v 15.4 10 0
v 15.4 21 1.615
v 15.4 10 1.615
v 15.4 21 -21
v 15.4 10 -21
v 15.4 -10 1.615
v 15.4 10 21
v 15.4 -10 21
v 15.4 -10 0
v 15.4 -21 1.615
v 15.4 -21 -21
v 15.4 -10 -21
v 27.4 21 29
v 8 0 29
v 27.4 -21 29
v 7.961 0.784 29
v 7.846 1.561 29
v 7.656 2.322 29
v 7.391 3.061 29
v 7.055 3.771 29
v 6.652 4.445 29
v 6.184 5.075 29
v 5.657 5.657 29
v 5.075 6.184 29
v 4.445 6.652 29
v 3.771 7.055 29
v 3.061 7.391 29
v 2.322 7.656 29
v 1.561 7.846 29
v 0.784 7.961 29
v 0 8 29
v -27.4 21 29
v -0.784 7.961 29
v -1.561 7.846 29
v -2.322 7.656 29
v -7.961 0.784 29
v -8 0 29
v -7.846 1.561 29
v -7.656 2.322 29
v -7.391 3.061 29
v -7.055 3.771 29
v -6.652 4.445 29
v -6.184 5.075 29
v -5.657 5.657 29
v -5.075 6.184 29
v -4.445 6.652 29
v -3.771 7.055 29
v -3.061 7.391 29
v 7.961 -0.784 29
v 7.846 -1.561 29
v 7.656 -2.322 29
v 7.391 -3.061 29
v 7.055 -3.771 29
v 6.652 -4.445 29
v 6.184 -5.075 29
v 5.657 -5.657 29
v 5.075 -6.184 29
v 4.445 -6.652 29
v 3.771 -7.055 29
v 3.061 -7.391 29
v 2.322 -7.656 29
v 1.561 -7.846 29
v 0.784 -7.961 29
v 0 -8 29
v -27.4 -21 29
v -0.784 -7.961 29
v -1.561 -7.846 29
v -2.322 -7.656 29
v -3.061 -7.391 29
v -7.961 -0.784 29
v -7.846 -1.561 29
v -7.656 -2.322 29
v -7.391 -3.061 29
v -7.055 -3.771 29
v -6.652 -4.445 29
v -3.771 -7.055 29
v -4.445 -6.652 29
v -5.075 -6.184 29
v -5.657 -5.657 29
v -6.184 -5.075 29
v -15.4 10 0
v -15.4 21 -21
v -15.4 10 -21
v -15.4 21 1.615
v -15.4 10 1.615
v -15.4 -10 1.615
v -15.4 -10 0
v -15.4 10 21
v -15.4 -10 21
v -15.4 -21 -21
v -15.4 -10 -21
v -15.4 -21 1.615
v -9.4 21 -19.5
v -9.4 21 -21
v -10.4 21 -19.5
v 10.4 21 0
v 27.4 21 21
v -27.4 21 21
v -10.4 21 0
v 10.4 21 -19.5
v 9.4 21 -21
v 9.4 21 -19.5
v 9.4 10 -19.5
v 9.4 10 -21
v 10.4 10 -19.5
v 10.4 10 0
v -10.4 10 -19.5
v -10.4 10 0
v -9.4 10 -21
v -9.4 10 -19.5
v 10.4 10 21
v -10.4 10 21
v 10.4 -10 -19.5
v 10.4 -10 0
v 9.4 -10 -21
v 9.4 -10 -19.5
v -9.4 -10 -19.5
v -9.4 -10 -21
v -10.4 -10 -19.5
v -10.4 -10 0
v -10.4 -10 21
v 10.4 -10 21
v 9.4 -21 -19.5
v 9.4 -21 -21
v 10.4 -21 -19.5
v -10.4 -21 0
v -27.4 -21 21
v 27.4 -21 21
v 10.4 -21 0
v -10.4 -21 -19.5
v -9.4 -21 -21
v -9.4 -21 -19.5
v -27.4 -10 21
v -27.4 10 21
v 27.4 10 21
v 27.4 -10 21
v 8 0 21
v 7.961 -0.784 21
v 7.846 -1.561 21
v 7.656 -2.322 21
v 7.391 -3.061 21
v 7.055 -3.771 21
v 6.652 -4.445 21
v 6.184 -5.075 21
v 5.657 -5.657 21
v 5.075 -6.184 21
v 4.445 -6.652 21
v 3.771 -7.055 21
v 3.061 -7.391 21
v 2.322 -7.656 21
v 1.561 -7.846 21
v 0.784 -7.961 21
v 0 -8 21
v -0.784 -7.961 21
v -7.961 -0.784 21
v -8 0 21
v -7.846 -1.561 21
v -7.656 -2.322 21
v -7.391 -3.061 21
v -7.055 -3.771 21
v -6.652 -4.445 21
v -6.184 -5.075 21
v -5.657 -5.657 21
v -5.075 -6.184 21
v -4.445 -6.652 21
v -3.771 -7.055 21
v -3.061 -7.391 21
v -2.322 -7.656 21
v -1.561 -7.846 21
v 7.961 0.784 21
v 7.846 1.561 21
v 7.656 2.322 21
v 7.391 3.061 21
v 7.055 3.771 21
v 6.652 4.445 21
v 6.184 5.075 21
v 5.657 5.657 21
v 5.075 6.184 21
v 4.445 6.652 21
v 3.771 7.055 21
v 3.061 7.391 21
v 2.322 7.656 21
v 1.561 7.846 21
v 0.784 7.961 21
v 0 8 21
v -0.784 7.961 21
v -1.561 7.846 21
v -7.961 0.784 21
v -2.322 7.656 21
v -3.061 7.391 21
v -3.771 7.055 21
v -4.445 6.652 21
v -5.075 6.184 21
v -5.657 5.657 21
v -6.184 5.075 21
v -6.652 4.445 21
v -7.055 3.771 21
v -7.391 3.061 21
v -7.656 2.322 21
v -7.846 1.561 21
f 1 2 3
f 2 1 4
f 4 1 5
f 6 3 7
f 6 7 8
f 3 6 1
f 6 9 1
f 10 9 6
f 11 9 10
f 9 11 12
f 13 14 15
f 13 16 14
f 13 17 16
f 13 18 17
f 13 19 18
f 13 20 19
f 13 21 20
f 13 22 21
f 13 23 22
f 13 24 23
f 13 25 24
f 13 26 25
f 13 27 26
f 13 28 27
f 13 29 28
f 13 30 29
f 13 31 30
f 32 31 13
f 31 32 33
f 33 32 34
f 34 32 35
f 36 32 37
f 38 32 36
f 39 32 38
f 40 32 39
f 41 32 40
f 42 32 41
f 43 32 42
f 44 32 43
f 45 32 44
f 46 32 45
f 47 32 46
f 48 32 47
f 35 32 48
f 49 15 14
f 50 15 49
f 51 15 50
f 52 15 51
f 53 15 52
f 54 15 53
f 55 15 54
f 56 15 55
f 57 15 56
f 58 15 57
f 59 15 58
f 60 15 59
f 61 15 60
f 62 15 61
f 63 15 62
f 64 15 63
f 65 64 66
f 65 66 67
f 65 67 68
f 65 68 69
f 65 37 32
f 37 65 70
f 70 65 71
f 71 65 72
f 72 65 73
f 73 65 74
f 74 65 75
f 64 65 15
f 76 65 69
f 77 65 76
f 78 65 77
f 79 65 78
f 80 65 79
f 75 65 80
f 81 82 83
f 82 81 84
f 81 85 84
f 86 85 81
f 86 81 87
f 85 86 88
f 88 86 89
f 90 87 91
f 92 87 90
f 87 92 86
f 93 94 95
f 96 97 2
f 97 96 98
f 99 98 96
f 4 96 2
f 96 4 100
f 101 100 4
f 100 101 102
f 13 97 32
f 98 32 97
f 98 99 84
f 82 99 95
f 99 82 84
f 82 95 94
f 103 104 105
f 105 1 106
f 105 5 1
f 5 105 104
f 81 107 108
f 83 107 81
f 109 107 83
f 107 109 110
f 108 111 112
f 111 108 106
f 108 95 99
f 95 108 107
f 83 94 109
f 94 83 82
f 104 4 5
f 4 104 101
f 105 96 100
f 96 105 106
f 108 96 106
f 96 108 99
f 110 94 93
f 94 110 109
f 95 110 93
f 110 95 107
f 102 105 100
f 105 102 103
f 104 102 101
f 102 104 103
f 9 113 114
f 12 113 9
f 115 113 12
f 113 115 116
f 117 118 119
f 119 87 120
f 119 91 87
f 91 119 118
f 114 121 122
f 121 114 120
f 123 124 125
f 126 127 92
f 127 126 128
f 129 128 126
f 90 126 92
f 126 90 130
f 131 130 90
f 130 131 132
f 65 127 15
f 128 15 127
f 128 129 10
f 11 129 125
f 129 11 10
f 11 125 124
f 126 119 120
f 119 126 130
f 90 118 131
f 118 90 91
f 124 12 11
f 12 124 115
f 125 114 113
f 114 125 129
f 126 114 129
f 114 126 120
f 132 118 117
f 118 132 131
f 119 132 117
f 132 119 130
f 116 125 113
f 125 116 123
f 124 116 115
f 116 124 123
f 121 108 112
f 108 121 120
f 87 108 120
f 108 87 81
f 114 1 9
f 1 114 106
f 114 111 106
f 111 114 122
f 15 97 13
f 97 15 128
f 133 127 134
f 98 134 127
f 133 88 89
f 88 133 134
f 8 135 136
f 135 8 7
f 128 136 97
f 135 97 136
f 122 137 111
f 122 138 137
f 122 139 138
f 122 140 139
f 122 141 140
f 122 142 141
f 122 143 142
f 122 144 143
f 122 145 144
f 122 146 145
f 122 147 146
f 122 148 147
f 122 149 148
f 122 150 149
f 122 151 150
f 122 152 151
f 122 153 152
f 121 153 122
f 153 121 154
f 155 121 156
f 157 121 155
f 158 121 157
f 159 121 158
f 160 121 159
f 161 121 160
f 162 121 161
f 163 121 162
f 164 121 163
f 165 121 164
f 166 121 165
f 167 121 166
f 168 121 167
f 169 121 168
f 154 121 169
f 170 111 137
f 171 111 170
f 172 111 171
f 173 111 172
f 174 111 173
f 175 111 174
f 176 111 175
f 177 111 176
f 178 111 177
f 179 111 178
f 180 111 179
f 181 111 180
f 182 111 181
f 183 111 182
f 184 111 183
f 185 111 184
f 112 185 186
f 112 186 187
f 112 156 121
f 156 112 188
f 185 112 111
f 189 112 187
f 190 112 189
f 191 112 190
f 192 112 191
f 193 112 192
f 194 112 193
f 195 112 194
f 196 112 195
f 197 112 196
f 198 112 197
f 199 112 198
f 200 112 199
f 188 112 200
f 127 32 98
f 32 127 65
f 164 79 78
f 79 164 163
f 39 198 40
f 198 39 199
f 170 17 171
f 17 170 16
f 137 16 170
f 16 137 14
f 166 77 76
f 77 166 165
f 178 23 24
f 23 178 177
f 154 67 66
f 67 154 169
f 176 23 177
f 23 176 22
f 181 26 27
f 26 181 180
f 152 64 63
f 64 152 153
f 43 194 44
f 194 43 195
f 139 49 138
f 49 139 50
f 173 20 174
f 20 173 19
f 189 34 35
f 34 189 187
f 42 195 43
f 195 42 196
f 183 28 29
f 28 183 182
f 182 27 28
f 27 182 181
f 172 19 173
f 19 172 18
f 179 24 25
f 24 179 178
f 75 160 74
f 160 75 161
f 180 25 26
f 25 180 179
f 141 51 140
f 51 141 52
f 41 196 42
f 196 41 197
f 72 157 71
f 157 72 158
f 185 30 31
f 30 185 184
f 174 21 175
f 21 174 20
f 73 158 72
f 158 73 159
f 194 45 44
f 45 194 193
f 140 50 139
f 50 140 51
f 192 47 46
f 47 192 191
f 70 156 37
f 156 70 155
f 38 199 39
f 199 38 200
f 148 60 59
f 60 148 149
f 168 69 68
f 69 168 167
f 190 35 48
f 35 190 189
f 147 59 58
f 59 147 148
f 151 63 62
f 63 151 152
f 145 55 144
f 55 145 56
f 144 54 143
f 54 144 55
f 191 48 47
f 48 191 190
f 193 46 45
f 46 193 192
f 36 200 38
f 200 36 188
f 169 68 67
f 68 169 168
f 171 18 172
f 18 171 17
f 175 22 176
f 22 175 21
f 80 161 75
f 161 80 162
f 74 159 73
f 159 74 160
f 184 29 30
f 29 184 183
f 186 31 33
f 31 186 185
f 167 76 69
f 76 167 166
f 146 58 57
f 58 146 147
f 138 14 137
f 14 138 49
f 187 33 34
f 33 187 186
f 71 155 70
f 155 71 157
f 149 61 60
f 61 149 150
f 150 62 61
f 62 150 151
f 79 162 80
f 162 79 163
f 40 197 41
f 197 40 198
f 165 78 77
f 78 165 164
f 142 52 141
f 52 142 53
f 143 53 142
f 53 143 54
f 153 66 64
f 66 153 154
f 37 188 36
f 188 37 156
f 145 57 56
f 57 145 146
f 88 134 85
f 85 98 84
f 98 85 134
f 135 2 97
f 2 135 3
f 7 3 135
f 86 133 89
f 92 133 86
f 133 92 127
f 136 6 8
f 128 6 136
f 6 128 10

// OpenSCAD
// file: ../perpendicular-u-joint-guard-v1.3-triangular-corner-fills/candidate_triangular_corner_fills.scad
// Candidate v1.3: four triangular concave-corner fill blocks.
//
// Base: accepted v0.7 eaves12 geometry. v0.9/v1.0/v1.1/v1.2 are not
// imported. Each corner block is a real triangular prism: broad at the roof,
// tapering continuously toward z=0, and overlapping the U side wall.

use <../perpendicular-u-joint-guard-v0.7/perpendicular_double_u_guard.scad>;

$fn = 48;
PART = "candidate_iso";

// Explicit v0.7 interface values.
roof_x_outer = 27.4;       // accepted eaves12 roof: -27.4..+27.4
side_wall_x_outer = 15.4;  // existing side-wall outer edge
blue_tube_x_outer = 10.0;  // blue lower 20x20 tube half-width
plate_y_inner = 10.0;
plate_y_outer = 21.0;
plate_depth_y = plate_y_outer - plate_y_inner; // 11 mm per front/back U plate

// The top edge is 0.5 mm inside the roof volume (roof underside z=21), and
// the lower point enters the side wall by 1 mm in X.  The XZ area therefore
// has positive overlap at both ends, not edge-only contact.
triangle_top_z = 21.5;
triangle_bottom_z = 0.0;
triangle_roof_overlap_z = triangle_top_z - 21.0;
triangle_side_overlap_x = 1.0;
triangle_inner_x = side_wall_x_outer - triangle_side_overlap_x; // 14.4

// Bottom retaining-hook contract copied from v0.7 for explicit verification.
hook_height_z = 1.5;
u_bottom_z = -21.0;
hook_top_z = u_bottom_z + hook_height_z; // -19.5

assert(plate_depth_y == 11, "每个三角块的前后板深必须是 11 mm");
assert(triangle_top_z > 21 && triangle_bottom_z == 0,
       "三角块上端必须搭入屋檐、下端落到 z=0");
assert(triangle_inner_x > blue_tube_x_outer,
       "三角块下端不得进入蓝色方管 x=-10..+10 包络");
assert(triangle_side_overlap_x > 0 && triangle_roof_overlap_z > 0,
       "三角块必须与屋檐和侧墙都有正重叠");
assert(hook_height_z == 1.5 && u_bottom_z == -21 && hook_top_z == -19.5,
       "底部卡脚必须保持 z=-21..-19.5");

// A polygon in XZ is extruded only through the corresponding front/back U
// plate. The center y=-10..+10 passage remains open.
module triangular_fill_xz(points, yc) {
    translate([0, yc, 0])
        rotate([90, 0, 0])
            linear_extrude(height = plate_depth_y,
                           center = true,
                           convexity = 10)
                polygon(points = points);
}

module front_neg_x_triangle() {
    // -X roof end -> +X inward. Top wide, lower point at the side wall.
    triangular_fill_xz([
        [-roof_x_outer, 21.0],
        [-triangle_inner_x, triangle_top_z],
        [-triangle_inner_x, triangle_bottom_z]
    ], (plate_y_inner + plate_y_outer) / 2);
}

module front_pos_x_triangle() {
    // +X roof end -> -X inward. Mirrored triangle.
    triangular_fill_xz([
        [roof_x_outer, 21.0],
        [triangle_inner_x, triangle_top_z],
        [triangle_inner_x, triangle_bottom_z]
    ], (plate_y_inner + plate_y_outer) / 2);
}

module back_neg_x_triangle() {
    triangular_fill_xz([
        [-roof_x_outer, 21.0],
        [-triangle_inner_x, triangle_top_z],
        [-triangle_inner_x, triangle_bottom_z]
    ], -(plate_y_inner + plate_y_outer) / 2);
}

module back_pos_x_triangle() {
    triangular_fill_xz([
        [roof_x_outer, 21.0],
        [triangle_inner_x, triangle_top_z],
        [triangle_inner_x, triangle_bottom_z]
    ], -(plate_y_inner + plate_y_outer) / 2);
}

module front_two_triangular_fills() {
    union() {
        front_neg_x_triangle();
        front_pos_x_triangle();
    }
}

module back_two_triangular_fills() {
    union() {
        back_neg_x_triangle();
        back_pos_x_triangle();
    }
}

module all_four_triangular_fills() {
    union() {
        front_two_triangular_fills();
        back_two_triangular_fills();
    }
}

module candidate_print_solid() {
    // Final hole operation is deliberately after the complete four-block
    // union; this preserves a true Z through-hole and the round nut pocket.
    difference() {
        union() {
            double_u_clip();
            all_four_triangular_fills();
        }
        vertical_screw_relief();
    }
}

module candidate_clip() {
    candidate_print_solid();
}

module candidate_assembly_iso() {
    upper_long_tube();
    lower_cross_tube();
    color([0.96, 0.39, 0.08]) double_u_clip();
    color([0.86, 0.13, 0.08]) front_two_triangular_fills();
    color([0.62, 0.12, 0.52]) back_two_triangular_fills();
    vertical_joint_screw();
}

module candidate_front_xz() {
    lower_cross_tube();
    color([0.96, 0.39, 0.08]) double_u_clip();
    color([0.86, 0.13, 0.08]) front_two_triangular_fills();
    vertical_joint_screw();
}

module candidate_back_xz() {
    lower_cross_tube();
    color([0.96, 0.39, 0.08]) double_u_clip();
    color([0.62, 0.12, 0.52]) back_two_triangular_fills();
    vertical_joint_screw();
}

module candidate_top_slice() {
    // At z=-0.5..2.5 the four blocks show their two front/back 11 mm bands;
    // the blue tube and the central y gap remain visible.
    slice_box = 200;
    color([0.28, 0.45, 0.78])
        intersection() {
            lower_cross_tube();
            translate([-slice_box / 2, -slice_box / 2, -0.5])
                cube([slice_box, slice_box, 3.0]);
        }
    color([0.96, 0.39, 0.08])
        intersection() {
            double_u_clip();
            translate([-slice_box / 2, -slice_box / 2, -0.5])
                cube([slice_box, slice_box, 3.0]);
        }
    color([0.86, 0.13, 0.08])
        intersection() {
            front_two_triangular_fills();
            translate([-slice_box / 2, -slice_box / 2, -0.5])
                cube([slice_box, slice_box, 3.0]);
        }
    color([0.62, 0.12, 0.52])
        intersection() {
            back_two_triangular_fills();
            translate([-slice_box / 2, -slice_box / 2, -0.5])
                cube([slice_box, slice_box, 3.0]);
        }
}

module candidate_hole_section() {
    // Center y=0 section: the bore and round nut pocket are shown without
    // confusing them with the bottom hook, which is outside this section.
    intersection() {
        candidate_print_solid();
        translate([-100, -0.4, -100]) cube([200, 0.8, 200]);
    }
}

module candidate_hook_check() {
    // Isolated lower detail: exact imported v0.7 U plate and blue tube, with
    // hook volumes highlighted only for review. This is not the print union.
    detail_box = 200;
    detail_z0 = -22;
    detail_h = 5;
    detail_y0 = 8;
    detail_ydepth = 15;
    intersection() {
        lower_cross_tube();
        translate([-detail_box / 2, detail_y0, detail_z0])
            cube([detail_box, detail_ydepth, detail_h]);
    }
    color([0.96, 0.39, 0.08])
        intersection() {
            u_plate(plate_y_inner, plate_y_outer);
            translate([-detail_box / 2, detail_y0, detail_z0])
                cube([detail_box, detail_ydepth, detail_h]);
        }
    color([0.20, 0.78, 0.20])
        intersection() {
            union() {
                translate([-13.65, 15.5, -20.25])
                    cube([3.5, 11, 1.5], center = true);
                translate([13.65, 15.5, -20.25])
                    cube([3.5, 11, 1.5], center = true);
            }
            translate([-detail_box / 2, detail_y0, detail_z0])
                cube([detail_box, detail_ydepth, detail_h]);
        }
}

if (PART == "candidate_clip") {
    candidate_clip();
} else if (PART == "candidate_front_xz") {
    candidate_front_xz();
} else if (PART == "candidate_back_xz") {
    candidate_back_xz();
} else if (PART == "candidate_top_slice") {
    candidate_top_slice();
} else if (PART == "candidate_hole_section") {
    candidate_hole_section();
} else if (PART == "candidate_hook_check") {
    candidate_hook_check();
} else {
    candidate_assembly_iso();
}
// main file
// v1.4: keep the exact v1.3 body; remove the nut-pocket floor with one
// full-depth Ø16 cylindrical subtraction. Units: mm; Z positive upwards.
// Imported v1.3 geometry contains all four triangles and the lower hooks.
use <../perpendicular-u-joint-guard-v1.3-triangular-corner-fills/candidate_triangular_corner_fills.scad>;

$fn = 48;
PART = "clip";
nut_passage_d = 16.0;

module full_depth_nut_passage() {
    // Cutter extends z=-31..39, past the whole printed z=-21..29 envelope.
    // 64 facets match the existing Ø16 pocket, avoiding a stepped profile.
    translate([0, 0, 4])
        cylinder(d = nut_passage_d, h = 70, center = true, $fn = 64);
}

module guard_v1_4() {
    difference() {
        candidate_print_solid();
        full_depth_nut_passage();
    }
}

guard_v1_4();
